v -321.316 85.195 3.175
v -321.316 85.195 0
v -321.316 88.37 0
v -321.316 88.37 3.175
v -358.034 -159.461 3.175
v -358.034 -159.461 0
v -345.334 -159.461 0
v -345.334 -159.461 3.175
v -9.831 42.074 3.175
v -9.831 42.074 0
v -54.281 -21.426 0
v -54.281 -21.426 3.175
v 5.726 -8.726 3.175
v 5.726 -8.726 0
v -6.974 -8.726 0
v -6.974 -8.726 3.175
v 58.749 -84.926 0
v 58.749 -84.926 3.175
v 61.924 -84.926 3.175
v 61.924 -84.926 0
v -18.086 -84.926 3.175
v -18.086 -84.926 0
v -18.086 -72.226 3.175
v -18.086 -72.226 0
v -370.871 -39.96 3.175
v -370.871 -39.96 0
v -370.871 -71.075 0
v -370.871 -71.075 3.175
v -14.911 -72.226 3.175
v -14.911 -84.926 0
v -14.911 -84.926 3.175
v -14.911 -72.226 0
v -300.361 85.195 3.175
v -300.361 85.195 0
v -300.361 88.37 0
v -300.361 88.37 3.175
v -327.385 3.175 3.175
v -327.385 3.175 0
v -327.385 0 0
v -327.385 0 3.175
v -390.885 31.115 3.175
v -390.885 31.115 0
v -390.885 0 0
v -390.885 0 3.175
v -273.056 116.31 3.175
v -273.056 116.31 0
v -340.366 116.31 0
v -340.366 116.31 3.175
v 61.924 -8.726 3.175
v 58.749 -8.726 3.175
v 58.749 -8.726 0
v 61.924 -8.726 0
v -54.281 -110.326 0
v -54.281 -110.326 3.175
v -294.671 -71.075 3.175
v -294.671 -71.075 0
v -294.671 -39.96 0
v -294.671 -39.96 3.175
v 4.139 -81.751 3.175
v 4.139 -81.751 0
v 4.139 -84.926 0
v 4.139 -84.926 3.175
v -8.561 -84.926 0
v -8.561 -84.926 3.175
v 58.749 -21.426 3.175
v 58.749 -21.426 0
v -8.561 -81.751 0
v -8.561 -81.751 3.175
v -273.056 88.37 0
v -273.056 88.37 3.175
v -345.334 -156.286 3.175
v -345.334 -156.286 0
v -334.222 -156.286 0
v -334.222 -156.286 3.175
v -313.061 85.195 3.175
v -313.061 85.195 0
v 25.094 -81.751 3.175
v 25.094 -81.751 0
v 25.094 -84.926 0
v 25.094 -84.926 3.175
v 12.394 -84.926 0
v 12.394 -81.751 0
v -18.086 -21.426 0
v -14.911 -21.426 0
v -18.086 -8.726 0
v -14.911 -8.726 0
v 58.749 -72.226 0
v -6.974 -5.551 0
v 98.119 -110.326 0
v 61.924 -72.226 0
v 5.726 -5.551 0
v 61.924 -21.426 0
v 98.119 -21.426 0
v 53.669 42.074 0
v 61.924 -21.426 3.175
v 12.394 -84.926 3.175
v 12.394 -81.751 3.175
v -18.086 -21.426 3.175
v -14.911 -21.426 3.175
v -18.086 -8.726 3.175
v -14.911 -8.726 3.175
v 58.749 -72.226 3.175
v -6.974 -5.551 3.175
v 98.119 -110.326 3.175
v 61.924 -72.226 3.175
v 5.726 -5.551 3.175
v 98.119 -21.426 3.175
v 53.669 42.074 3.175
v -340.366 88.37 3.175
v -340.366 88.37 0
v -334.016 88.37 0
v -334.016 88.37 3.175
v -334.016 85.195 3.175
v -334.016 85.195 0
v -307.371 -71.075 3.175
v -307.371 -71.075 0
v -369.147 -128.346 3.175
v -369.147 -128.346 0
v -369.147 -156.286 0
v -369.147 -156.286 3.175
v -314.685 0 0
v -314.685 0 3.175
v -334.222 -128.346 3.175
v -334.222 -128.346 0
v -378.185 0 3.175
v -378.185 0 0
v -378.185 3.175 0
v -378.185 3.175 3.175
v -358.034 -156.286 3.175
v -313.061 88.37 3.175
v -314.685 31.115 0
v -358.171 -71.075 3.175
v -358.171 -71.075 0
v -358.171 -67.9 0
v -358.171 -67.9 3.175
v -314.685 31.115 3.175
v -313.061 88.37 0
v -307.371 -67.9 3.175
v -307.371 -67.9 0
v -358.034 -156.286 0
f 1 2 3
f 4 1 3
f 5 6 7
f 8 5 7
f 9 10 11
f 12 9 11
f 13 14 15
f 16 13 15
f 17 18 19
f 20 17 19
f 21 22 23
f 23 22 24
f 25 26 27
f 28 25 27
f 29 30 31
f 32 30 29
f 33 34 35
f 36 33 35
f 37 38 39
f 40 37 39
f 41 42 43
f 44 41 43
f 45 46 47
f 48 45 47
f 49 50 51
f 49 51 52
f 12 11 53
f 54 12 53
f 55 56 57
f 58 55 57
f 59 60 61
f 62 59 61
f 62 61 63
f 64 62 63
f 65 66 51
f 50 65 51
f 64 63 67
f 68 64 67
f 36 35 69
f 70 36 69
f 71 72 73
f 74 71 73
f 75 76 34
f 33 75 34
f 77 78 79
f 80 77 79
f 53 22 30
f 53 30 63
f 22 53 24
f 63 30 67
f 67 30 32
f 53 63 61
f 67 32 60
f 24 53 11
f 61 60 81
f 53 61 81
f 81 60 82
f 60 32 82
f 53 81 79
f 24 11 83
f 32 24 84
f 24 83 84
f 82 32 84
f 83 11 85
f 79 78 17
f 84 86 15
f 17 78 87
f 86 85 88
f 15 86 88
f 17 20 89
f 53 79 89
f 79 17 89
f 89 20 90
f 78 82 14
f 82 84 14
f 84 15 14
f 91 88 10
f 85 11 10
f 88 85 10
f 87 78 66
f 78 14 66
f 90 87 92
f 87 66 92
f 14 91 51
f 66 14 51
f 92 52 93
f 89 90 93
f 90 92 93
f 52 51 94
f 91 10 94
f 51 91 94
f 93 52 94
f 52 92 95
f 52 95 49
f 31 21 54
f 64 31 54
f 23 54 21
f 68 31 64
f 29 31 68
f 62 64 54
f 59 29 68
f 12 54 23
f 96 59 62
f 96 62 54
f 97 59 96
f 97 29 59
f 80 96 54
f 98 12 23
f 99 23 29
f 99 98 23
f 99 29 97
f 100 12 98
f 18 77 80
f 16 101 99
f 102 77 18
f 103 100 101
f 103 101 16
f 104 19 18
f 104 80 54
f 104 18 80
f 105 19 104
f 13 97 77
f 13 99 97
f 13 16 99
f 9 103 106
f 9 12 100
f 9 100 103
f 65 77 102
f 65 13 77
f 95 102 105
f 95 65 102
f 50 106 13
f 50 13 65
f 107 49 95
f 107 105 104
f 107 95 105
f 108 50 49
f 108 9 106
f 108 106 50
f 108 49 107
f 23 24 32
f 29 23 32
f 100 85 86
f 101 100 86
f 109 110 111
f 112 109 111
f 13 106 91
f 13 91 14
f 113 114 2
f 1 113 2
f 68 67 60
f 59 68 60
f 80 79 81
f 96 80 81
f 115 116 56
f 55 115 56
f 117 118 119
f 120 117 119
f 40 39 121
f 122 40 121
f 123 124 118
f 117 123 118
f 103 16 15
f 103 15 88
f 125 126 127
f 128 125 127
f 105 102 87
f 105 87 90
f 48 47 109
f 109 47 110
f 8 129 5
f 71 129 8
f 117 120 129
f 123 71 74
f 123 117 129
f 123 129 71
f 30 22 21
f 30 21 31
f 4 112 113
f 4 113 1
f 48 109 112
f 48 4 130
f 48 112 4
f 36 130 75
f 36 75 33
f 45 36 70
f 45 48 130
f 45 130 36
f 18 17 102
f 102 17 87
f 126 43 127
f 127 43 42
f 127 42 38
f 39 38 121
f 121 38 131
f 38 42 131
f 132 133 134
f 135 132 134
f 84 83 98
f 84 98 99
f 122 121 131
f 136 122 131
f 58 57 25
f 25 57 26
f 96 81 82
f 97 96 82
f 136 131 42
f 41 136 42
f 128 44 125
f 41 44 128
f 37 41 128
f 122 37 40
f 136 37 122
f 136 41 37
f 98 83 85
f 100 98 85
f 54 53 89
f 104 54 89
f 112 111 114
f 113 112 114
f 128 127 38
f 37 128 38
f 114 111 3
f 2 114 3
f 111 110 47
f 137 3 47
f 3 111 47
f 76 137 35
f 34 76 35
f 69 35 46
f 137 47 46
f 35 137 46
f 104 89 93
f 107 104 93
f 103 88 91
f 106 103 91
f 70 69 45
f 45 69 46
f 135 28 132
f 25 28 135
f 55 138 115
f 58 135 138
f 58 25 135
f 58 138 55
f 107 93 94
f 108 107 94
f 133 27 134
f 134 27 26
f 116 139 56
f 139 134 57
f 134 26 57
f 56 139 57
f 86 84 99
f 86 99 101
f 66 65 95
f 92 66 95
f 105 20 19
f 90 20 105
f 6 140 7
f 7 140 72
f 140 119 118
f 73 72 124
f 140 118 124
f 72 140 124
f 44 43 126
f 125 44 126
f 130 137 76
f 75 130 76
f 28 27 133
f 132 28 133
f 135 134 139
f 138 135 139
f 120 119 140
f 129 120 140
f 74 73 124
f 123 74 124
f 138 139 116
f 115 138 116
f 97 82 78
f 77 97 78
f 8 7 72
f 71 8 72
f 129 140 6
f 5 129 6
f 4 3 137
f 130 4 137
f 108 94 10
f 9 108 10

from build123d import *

# Parameters (mm, degrees)
F2_DEPTH = 3.175
F0_W     = 3.175
F0_H     = 12.7
F3_DEPTH = 3.175


# Not quite as in the source:
# - a feature names something its author has since deleted; it is built from what else it names


with BuildPart() as f2:
    # F1 (on Top) → F2 (new body)
    with BuildSketch(Plane.XY):
        Polygon((-273.056358099, 116.3102710271), (-340.366358099, 116.3102710271), (-340.366358099, 88.3702710271), (-334.016358099, 88.3702710271), (-334.016358099, 85.1952710271), (-321.316358099, 85.1952710271), (-321.316358099, 88.3702710271), (-313.061358099, 88.3702710271), (-313.061358099, 85.1952710271), (-300.361358099, 85.1952710271), (-300.361358099, 88.3702710271), (-273.056358099, 88.3702710271), align=None)
    extrude(amount=F2_DEPTH)


with BuildPart() as f2b:
    # F1 (on Top) → F2, piece 2 (new body)
    with BuildSketch(Plane.XY):
        Polygon((-314.6848678589, 31.115), (-390.8848678589, 31.115), (-390.8848678589, 3.175), (-390.8848678589, 0), (-378.1848678589, 0), (-378.1848678589, 3.175), (-327.3848678589, 3.175), (-327.3848678589, 0), (-314.6848678589, 0), (-314.6848678589, 3.175), align=None)
    extrude(amount=F2_DEPTH)


with BuildPart() as f2c:
    # F1 (on Top) → F2, piece 3 (new body)
    with BuildSketch(Plane.XY):
        Polygon((-294.6711480618, -39.9599104619), (-370.8711480618, -39.9599104619), (-370.8711480618, -67.8999104619), (-370.8711480618, -71.0749104619), (-358.1711480618, -71.0749104619), (-358.1711480618, -67.8999104619), (-307.3711480618, -67.8999104619), (-307.3711480618, -71.0749104619), (-294.6711480618, -71.0749104619), (-294.6711480618, -67.8999104619), align=None)
    extrude(amount=F2_DEPTH)


with BuildPart() as f2d:
    # F1 (on Top) → F2, piece 4 (new body)
    with BuildSketch(Plane.XY):
        Polygon((-334.2218278885, -128.3455094671), (-369.1468278885, -128.3455094671), (-369.1468278885, -156.2855094671), (-358.0343278885, -156.2855094671), (-358.0343278885, -159.4605094671), (-345.3343278885, -159.4605094671), (-345.3343278885, -156.2855094671), (-334.2218278885, -156.2855094671), align=None)
    extrude(amount=F2_DEPTH)


with BuildPart() as f3:
    # F0 (on Top) → F3 (new body)
    with BuildSketch(Plane.XY):
        Polygon((-54.2813502252, -26.5063998628), (-54.2813502252, -110.3263998628), (-41.5813502252, -110.3263998628), (-18.0863502252, -110.3263998628), (0, -110.3263998628), (21.9186497748, -110.3263998628), (53.6686497748, -110.3263998628), (85.4186497748, -110.3263998628), (98.1186497748, -110.3263998628), (98.1186497748, -98.0041697621), (98.1186497748, -34.1263998628), (98.1186497748, -26.5063998628), (98.1186497748, -21.4263998628), (53.6686497748, 42.0736001372), (-9.8313502252, 42.0736001372), (-54.2813502252, -21.4263998628), align=None)
        with Locations((-16.4988502252, -78.5763998628)):
            Rectangle(F0_W, F0_H, mode=Mode.SUBTRACT)
        Polygon((4.1386497748, -84.9263998628), (-2.2113502252, -84.9263998628), (-8.5613502252, -84.9263998628), (-8.5613502252, -81.7513998628), (4.1386497748, -81.7513998628), align=None, mode=Mode.SUBTRACT)
        Polygon((25.0936497748, -84.9263998628), (18.7436497748, -84.9263998628), (12.3936497748, -84.9263998628), (12.3936497748, -81.7513998628), (25.0936497748, -81.7513998628), align=None, mode=Mode.SUBTRACT)
        with Locations((60.3361497748, -78.5763998628)):
            Rectangle(F0_W, F0_H, mode=Mode.SUBTRACT)
        with Locations((-16.4988502252, -15.0763998628)):
            Rectangle(F0_W, F0_H, mode=Mode.SUBTRACT)
        Polygon((5.7261497748, -8.7263998628), (-0.6238502252, -8.7263998628), (-6.9738502252, -8.7263998628), (-6.9738502252, -5.5513998628), (5.7261497748, -5.5513998628), align=None, mode=Mode.SUBTRACT)
        with Locations((60.3361497748, -15.0763998628)):
            Rectangle(F0_W, F0_H, mode=Mode.SUBTRACT)
    extrude(amount=F3_DEPTH)


solid = Compound([f2.part, f2b.part, f2c.part, f2d.part, f3.part])
